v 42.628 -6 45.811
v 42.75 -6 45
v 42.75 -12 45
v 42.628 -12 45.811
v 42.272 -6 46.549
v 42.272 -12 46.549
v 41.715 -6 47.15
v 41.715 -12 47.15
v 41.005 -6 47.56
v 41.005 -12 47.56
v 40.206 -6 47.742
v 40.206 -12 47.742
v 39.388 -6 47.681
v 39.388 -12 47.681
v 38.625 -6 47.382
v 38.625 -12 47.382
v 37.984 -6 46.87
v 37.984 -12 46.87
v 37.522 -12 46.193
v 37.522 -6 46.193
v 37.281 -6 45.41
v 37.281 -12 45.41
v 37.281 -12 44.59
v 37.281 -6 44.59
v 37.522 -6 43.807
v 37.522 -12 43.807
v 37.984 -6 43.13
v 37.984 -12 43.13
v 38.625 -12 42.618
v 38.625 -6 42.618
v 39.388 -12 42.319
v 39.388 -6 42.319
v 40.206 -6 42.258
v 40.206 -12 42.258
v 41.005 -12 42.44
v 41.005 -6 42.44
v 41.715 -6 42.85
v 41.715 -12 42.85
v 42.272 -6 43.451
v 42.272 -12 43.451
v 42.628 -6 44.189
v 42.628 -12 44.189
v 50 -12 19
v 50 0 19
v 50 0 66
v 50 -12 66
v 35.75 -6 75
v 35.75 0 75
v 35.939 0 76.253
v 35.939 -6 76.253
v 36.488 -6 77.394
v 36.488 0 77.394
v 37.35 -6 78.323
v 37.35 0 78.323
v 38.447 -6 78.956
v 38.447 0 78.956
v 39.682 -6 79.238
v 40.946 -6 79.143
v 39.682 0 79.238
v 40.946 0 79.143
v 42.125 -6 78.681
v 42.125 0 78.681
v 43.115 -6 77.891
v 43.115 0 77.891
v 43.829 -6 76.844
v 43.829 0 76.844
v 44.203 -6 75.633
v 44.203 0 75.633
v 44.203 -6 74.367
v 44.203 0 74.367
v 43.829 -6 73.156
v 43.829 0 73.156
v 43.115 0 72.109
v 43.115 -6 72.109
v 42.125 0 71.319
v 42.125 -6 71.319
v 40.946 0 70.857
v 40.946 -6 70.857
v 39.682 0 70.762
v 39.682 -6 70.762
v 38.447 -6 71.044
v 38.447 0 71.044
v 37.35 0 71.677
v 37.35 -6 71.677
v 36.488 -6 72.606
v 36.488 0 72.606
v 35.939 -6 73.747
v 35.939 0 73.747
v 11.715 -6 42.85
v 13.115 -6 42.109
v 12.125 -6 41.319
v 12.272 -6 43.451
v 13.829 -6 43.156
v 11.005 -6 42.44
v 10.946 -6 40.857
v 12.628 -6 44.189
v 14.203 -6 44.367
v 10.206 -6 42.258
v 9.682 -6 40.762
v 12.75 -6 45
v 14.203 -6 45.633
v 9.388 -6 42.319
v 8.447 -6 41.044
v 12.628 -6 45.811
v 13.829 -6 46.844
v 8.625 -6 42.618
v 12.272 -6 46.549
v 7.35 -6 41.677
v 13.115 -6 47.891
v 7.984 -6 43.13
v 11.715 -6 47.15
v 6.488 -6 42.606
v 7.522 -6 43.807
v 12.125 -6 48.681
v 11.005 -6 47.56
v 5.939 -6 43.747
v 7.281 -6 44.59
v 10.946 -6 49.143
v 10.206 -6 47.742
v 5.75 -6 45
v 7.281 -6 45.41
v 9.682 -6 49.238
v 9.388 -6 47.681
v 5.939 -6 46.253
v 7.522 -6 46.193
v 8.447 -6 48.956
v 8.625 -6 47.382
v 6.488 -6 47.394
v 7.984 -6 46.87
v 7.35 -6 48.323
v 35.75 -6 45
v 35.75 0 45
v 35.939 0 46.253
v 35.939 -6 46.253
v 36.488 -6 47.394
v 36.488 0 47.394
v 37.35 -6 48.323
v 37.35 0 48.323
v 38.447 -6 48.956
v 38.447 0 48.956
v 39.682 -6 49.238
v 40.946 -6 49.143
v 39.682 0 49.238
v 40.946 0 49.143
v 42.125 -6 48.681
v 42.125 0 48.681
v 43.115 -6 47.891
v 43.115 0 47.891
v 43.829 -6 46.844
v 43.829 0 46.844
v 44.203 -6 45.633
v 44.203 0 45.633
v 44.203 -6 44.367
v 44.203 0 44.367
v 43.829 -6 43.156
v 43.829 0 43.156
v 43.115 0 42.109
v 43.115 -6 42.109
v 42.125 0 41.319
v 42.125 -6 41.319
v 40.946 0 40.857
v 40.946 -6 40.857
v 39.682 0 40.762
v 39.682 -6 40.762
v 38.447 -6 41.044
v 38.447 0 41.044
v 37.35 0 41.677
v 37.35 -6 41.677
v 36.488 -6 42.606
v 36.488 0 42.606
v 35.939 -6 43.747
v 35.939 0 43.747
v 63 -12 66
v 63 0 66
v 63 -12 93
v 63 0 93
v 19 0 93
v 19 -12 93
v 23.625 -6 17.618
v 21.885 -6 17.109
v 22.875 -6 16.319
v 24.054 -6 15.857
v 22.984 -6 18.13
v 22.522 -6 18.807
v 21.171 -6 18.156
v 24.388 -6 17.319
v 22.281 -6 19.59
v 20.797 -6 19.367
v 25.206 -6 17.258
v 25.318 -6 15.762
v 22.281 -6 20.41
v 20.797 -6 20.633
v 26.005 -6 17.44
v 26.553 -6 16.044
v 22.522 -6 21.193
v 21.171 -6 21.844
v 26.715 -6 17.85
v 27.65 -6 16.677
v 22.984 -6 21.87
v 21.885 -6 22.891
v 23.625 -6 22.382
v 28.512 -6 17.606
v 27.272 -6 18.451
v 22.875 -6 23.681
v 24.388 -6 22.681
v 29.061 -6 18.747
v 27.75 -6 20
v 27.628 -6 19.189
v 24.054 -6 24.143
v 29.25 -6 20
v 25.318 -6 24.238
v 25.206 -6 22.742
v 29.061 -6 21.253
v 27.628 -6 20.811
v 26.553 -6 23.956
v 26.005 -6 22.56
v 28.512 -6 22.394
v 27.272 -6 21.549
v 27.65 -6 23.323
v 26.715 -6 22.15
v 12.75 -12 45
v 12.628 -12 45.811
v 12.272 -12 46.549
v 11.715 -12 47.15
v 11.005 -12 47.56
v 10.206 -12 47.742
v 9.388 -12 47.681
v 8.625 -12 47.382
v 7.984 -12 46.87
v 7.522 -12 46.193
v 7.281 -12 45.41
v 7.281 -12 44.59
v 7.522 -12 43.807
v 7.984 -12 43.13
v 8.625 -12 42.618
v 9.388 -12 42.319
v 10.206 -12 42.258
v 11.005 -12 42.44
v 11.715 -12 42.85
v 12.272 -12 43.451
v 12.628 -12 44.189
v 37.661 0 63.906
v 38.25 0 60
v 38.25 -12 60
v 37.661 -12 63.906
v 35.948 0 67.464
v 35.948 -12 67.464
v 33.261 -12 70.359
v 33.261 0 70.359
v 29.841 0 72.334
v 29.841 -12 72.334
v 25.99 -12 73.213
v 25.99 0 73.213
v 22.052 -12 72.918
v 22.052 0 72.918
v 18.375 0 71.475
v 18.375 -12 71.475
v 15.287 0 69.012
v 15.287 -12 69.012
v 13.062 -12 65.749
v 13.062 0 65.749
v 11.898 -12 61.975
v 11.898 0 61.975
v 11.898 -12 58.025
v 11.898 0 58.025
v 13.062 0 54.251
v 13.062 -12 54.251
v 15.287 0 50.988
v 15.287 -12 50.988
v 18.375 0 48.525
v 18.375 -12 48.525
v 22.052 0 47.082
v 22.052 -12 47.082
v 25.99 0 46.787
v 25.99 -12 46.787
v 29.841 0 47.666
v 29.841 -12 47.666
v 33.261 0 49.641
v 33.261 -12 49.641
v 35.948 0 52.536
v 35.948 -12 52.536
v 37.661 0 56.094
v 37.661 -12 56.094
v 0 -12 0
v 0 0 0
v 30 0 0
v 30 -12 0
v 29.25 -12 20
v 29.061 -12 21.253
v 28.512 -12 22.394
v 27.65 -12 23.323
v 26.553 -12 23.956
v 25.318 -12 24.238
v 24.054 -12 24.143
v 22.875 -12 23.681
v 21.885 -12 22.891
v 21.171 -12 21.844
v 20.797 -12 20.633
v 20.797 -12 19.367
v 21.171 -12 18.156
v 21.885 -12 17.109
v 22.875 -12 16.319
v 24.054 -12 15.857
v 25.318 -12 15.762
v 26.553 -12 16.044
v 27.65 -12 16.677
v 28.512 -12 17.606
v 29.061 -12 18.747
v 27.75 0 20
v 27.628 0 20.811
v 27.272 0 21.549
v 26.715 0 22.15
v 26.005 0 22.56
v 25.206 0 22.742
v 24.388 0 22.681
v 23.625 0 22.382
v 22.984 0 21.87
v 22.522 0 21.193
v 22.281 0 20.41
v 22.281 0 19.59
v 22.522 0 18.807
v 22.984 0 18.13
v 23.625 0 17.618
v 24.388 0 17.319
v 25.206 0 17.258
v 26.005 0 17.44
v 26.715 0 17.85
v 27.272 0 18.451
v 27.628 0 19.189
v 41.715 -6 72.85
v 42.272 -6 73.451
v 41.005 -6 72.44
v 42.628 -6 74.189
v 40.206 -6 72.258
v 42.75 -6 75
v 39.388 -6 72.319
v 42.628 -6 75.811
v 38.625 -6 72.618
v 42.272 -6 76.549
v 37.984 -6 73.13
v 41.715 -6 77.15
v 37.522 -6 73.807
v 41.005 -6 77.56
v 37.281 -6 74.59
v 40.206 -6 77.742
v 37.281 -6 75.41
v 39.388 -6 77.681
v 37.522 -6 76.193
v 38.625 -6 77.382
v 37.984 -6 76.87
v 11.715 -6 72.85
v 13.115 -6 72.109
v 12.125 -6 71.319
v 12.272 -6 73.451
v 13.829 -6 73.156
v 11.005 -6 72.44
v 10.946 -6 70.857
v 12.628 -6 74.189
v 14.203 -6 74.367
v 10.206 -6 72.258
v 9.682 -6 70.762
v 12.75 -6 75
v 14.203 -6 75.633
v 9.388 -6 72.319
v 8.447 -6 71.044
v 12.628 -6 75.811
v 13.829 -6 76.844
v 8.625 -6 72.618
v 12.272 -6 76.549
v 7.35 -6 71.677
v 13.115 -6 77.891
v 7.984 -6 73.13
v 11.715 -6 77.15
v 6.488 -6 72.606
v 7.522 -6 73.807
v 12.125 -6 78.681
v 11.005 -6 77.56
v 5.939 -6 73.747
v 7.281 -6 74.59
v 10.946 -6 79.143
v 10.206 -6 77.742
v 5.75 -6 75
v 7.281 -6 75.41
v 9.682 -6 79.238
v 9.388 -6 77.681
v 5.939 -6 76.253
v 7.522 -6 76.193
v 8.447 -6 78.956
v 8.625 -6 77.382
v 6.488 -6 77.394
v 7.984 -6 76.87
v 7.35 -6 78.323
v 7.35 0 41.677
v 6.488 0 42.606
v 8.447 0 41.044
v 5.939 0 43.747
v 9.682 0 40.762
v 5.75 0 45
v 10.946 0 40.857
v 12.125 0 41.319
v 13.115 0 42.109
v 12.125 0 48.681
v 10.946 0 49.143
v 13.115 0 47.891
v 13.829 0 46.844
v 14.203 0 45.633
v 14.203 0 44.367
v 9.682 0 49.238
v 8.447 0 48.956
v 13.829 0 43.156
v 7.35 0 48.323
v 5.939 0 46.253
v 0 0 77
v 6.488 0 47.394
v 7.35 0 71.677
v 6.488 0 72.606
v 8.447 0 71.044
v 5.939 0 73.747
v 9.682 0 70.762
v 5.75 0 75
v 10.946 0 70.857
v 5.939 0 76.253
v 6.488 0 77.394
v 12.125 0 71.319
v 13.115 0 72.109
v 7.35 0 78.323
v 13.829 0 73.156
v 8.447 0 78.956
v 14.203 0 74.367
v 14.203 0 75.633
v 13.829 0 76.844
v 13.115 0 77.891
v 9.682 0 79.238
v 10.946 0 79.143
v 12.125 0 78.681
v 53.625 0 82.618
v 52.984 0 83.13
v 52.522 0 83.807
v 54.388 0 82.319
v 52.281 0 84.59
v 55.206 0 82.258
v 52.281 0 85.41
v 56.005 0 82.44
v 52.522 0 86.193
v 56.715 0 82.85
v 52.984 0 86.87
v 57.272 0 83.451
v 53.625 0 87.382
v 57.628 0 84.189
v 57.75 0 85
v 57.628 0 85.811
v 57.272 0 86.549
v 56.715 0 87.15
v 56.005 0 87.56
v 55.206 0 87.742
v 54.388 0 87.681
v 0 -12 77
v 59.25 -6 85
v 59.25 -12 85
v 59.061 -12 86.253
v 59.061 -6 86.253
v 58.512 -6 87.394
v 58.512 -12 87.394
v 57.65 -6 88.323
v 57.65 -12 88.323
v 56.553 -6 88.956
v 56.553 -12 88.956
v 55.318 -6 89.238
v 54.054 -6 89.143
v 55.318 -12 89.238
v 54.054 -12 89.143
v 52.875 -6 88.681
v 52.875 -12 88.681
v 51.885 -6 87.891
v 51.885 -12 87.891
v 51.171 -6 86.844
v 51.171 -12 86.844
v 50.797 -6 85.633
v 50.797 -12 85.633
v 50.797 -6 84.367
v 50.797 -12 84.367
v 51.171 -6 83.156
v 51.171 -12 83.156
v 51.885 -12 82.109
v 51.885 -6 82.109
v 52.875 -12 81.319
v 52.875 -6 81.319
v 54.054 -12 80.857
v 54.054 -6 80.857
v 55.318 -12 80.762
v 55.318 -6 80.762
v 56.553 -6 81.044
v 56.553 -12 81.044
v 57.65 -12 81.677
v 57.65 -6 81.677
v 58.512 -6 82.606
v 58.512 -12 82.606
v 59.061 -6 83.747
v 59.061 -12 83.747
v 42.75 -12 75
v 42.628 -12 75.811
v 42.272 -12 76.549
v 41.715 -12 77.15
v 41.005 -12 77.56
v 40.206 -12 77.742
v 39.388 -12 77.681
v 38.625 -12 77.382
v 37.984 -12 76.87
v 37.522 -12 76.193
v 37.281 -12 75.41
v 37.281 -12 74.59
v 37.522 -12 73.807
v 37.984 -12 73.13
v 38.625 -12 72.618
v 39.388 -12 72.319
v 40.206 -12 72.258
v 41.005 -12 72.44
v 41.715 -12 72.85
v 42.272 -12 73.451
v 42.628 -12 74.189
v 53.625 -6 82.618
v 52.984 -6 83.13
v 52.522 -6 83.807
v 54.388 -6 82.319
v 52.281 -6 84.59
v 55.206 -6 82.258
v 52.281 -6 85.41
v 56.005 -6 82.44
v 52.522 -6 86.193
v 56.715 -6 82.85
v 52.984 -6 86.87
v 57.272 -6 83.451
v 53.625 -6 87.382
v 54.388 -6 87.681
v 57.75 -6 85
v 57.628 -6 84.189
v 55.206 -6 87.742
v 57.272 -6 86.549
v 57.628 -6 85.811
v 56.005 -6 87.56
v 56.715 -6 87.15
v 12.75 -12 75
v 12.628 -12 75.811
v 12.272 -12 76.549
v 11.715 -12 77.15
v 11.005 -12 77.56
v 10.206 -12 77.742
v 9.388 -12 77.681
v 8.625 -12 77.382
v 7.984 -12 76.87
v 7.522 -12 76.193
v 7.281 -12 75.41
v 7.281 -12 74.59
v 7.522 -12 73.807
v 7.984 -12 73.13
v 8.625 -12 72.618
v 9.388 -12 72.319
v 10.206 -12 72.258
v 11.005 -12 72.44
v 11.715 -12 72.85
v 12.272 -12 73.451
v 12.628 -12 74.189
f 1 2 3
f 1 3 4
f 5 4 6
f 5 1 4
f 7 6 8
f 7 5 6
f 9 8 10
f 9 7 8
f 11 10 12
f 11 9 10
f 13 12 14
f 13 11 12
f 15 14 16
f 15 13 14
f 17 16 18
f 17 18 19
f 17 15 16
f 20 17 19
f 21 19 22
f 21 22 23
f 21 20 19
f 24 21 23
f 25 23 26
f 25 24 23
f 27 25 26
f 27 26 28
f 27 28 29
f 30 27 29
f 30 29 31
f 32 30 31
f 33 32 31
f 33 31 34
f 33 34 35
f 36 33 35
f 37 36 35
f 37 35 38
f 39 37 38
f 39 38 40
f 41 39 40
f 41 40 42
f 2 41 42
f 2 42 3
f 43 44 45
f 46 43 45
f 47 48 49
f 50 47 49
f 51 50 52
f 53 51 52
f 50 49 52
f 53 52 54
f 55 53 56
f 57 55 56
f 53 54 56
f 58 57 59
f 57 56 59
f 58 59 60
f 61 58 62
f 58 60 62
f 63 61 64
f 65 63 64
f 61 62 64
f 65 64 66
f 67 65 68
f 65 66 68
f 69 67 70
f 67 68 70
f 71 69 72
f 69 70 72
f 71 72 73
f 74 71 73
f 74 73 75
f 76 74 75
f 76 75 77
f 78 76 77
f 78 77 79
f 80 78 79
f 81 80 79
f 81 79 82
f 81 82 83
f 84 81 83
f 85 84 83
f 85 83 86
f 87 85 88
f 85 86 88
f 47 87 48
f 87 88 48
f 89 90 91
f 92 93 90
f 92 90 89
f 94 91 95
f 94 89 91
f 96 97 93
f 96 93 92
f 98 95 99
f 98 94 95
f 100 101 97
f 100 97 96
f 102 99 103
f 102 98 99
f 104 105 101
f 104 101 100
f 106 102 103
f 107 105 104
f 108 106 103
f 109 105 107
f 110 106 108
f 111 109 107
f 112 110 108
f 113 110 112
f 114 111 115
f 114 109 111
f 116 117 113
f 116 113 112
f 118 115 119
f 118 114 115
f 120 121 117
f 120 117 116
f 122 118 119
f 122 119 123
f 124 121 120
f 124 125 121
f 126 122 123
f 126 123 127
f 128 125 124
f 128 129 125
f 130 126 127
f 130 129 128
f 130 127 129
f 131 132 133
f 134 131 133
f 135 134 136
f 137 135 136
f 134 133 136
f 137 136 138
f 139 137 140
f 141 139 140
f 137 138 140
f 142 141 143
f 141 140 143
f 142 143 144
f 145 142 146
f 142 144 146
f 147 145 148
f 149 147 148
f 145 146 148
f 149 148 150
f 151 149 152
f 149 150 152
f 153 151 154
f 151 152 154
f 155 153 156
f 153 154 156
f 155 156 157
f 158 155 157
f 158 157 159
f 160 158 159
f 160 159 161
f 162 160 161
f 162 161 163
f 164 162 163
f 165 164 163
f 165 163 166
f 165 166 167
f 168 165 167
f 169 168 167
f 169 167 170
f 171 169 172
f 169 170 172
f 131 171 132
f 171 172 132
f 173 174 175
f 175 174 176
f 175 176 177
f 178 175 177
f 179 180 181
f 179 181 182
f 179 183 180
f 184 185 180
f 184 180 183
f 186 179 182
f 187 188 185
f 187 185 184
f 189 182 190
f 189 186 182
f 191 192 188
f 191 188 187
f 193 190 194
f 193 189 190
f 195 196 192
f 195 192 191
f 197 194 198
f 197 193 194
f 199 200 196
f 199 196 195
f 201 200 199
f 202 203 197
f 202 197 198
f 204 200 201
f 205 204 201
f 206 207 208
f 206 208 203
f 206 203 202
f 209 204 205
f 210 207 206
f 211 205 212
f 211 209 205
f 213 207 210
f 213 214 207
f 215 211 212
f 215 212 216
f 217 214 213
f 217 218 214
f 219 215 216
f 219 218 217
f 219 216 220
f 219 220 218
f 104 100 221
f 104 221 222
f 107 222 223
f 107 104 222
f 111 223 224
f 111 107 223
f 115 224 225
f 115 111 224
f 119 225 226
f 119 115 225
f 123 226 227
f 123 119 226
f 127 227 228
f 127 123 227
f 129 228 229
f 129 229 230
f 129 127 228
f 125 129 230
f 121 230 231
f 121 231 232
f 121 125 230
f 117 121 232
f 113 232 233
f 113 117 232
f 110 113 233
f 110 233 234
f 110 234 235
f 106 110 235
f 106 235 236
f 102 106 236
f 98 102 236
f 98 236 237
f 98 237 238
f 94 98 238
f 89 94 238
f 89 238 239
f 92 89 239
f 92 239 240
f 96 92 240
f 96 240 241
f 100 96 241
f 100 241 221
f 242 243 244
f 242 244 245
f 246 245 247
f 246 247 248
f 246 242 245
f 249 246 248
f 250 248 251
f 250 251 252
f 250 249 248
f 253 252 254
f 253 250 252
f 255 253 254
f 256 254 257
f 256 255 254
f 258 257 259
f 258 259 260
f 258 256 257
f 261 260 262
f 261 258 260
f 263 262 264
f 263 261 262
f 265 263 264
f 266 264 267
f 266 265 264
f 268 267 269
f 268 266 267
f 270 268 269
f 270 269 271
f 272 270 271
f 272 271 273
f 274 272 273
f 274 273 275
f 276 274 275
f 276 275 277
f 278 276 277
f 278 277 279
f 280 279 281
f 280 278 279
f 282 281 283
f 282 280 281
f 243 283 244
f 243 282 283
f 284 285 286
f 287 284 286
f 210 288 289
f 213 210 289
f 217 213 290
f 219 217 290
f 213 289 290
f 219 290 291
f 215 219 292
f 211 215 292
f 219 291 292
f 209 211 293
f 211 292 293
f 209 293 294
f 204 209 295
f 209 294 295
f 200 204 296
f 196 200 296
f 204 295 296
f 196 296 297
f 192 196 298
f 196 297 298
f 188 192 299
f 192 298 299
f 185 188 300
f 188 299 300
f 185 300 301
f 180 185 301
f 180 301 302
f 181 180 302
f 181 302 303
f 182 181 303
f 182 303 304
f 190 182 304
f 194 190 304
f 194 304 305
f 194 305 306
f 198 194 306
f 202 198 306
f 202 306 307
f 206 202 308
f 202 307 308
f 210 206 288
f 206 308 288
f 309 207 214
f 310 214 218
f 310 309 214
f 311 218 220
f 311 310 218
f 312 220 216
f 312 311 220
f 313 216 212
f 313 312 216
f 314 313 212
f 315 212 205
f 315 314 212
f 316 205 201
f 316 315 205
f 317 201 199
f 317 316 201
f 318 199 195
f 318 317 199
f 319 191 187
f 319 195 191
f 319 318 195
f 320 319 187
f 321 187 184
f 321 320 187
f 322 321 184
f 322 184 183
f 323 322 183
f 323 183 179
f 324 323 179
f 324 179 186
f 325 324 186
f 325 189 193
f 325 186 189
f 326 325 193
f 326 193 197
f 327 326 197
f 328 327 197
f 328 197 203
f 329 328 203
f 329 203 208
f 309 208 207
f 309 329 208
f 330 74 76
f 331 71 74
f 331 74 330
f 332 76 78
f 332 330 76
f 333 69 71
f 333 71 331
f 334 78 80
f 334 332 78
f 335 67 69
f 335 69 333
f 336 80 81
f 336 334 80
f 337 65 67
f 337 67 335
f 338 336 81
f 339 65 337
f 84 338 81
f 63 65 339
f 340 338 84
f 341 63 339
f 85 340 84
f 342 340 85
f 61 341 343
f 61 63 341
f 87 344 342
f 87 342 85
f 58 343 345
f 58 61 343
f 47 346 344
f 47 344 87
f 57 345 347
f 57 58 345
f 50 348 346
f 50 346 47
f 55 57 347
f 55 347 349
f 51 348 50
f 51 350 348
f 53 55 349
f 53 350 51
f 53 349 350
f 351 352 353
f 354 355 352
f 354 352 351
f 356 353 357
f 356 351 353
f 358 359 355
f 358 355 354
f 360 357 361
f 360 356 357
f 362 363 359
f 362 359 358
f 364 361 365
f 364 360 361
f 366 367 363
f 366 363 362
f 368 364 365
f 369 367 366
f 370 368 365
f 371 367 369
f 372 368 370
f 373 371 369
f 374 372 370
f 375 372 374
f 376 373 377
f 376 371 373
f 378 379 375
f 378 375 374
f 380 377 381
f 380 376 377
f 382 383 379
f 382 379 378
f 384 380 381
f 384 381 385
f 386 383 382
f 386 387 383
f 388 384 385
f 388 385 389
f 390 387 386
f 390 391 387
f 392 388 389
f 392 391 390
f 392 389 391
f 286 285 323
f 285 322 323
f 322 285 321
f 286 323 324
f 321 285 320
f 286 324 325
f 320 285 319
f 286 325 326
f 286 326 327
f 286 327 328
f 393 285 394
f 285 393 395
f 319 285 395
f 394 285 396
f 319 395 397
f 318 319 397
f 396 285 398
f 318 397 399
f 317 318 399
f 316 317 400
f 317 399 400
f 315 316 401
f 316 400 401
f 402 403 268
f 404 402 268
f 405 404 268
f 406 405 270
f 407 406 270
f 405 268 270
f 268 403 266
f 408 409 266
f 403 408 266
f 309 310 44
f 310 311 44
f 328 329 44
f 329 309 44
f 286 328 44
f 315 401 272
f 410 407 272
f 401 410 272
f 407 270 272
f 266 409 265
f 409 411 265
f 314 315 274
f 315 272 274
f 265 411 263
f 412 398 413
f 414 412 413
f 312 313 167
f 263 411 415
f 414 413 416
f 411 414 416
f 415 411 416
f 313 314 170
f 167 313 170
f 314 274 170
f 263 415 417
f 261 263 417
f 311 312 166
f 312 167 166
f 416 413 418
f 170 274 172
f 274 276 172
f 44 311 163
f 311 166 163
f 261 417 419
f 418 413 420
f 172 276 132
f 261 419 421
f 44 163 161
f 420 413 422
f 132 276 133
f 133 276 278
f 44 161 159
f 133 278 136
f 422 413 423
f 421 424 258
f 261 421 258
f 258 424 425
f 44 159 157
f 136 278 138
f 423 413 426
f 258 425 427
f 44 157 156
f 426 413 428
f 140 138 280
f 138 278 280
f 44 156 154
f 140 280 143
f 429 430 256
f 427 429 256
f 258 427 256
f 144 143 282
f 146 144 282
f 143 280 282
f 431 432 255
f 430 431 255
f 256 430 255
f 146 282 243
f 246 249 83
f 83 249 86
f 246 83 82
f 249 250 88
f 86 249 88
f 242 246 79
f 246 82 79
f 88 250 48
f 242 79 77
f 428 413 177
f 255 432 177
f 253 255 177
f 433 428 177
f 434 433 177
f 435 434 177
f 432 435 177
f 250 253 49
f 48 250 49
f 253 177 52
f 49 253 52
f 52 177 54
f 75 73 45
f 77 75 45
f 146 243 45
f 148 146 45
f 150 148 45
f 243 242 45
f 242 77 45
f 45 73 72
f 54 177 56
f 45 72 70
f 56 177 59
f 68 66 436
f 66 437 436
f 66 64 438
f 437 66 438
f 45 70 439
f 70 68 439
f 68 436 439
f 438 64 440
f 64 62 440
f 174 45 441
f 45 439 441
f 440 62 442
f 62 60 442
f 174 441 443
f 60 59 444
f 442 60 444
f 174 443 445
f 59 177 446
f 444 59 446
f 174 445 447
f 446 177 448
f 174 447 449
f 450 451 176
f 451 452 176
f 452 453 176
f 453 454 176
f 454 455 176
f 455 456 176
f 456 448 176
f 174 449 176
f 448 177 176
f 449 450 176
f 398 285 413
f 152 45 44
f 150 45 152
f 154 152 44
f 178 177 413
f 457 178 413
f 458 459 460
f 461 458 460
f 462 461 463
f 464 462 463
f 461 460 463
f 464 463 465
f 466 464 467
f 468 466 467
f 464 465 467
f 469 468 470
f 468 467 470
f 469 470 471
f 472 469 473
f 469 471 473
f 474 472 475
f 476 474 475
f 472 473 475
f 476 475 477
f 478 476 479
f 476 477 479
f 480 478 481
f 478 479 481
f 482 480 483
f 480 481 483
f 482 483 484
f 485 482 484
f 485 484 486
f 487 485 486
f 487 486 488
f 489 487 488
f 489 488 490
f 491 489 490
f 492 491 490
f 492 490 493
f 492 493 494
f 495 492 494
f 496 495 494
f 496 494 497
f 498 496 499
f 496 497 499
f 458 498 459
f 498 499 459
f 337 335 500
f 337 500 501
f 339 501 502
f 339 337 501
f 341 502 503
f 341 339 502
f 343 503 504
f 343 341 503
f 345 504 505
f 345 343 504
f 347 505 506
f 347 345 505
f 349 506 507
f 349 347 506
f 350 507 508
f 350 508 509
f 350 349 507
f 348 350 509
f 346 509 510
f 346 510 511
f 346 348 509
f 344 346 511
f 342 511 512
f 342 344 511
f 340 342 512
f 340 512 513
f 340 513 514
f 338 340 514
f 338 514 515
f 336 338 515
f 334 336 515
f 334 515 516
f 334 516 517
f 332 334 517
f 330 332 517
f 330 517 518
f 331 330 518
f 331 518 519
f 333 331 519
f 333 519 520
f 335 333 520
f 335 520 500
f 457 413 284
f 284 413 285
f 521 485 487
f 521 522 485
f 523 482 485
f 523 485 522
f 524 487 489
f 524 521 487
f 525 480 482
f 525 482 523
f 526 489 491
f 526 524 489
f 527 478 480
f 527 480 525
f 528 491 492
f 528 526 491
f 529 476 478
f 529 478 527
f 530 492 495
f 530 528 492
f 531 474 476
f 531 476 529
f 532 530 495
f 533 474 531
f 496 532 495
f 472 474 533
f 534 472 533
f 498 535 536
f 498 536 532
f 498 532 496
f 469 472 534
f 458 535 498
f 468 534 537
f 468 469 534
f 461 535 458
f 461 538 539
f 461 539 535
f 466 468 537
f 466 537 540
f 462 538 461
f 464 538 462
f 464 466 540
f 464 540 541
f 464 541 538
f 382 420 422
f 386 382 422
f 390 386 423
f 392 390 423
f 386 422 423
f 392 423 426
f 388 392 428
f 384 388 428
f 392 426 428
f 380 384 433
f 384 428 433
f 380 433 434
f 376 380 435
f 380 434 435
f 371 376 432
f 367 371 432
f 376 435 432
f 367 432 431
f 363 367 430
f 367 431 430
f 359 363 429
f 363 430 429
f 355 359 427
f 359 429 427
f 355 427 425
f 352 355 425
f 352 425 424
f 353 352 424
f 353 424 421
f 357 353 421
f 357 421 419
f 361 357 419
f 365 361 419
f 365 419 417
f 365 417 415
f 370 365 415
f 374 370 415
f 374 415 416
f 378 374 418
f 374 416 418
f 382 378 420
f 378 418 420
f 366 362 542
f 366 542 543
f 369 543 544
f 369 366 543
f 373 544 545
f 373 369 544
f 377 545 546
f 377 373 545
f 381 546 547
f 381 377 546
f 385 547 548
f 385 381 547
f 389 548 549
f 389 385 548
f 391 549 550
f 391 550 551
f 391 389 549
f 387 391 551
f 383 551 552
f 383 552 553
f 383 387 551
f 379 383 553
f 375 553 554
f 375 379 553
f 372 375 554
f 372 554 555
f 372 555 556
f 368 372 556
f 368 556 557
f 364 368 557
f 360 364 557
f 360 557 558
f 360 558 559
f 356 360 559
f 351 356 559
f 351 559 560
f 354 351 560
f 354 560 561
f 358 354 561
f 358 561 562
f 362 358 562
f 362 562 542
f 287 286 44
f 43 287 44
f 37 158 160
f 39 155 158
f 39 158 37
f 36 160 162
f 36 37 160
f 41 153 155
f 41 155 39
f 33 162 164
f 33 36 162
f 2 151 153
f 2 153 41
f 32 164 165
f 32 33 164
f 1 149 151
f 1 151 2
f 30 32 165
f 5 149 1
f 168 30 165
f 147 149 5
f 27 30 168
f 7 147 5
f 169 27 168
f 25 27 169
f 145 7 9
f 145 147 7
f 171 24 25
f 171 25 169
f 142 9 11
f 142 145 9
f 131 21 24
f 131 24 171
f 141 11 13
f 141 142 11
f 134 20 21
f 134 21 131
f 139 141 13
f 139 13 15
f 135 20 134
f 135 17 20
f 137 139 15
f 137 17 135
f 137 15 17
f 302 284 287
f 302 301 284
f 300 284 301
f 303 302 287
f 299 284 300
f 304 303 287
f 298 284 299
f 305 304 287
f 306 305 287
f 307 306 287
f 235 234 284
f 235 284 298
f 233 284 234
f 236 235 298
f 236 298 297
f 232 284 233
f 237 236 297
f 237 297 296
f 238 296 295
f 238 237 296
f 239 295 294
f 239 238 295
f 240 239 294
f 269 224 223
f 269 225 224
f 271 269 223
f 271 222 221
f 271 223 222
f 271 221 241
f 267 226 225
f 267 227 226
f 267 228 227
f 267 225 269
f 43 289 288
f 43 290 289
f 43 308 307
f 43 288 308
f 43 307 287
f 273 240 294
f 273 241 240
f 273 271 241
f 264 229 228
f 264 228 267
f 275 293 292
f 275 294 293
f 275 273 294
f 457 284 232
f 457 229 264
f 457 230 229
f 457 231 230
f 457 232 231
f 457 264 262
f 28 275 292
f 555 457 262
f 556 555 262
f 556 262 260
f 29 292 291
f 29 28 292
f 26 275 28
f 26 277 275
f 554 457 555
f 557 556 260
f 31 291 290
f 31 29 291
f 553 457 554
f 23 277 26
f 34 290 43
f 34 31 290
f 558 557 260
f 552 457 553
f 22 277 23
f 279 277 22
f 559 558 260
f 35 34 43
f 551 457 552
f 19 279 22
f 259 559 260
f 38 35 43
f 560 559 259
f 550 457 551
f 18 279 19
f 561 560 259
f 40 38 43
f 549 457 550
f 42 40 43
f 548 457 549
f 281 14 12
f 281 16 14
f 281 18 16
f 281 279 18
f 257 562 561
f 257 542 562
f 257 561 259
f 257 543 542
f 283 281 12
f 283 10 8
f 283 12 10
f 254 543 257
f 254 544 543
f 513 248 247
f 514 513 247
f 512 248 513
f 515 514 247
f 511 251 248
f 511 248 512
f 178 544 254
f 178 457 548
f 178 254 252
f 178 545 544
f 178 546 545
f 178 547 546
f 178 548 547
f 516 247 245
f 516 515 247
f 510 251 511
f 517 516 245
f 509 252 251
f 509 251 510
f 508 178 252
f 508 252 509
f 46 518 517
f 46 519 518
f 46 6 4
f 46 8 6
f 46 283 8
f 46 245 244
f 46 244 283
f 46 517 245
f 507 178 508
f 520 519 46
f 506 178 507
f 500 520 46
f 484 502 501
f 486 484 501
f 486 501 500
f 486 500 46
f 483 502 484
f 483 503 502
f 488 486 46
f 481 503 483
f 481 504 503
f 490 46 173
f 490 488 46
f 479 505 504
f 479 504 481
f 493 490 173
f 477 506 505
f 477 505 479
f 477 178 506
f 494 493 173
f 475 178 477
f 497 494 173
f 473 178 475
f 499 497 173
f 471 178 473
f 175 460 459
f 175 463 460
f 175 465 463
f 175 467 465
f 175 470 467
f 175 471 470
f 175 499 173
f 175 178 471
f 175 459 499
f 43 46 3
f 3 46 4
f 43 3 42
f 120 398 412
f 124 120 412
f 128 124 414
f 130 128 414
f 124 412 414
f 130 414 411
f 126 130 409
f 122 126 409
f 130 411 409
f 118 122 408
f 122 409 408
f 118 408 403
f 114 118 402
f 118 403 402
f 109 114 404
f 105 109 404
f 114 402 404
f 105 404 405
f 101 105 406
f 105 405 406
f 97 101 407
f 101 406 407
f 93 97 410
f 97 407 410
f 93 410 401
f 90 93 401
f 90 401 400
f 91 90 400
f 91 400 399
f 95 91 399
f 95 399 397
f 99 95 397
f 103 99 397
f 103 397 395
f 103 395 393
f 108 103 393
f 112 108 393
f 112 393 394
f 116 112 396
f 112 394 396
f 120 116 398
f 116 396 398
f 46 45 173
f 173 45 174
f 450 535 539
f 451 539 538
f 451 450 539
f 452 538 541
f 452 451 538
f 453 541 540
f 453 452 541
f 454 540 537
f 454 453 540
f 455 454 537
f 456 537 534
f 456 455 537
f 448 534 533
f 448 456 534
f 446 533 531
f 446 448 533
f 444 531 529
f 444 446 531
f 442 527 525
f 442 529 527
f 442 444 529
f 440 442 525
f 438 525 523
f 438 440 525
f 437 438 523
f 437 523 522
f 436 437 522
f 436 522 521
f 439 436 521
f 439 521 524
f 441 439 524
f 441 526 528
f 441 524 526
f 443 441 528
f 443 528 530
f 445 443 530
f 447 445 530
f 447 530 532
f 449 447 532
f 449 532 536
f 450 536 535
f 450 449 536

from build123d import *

# Parameters (mm, degrees)
F0_R     = 2.75
F0_R_2   = 13.25
F1_DEPTH = 12
F2_R     = 4.25
F3_DEPTH = 6
F4_R     = 4.25
F5_DEPTH = 6


with BuildPart() as f1:
    # F0 (on Front) → F1 (new body)
    with BuildSketch(Plane.XZ):
        Polygon((19, 93), (0, 77), (0, 0), (30, 0), (50, 19), (50, 66), (63, 66), (63, 93), align=None)
        with Locations((25, 20)):
            Circle(F0_R, mode=Mode.SUBTRACT)
        with Locations((10, 45)):
            Circle(F0_R, mode=Mode.SUBTRACT)
        with Locations((40, 45)):
            Circle(F0_R, mode=Mode.SUBTRACT)
        with Locations((25, 60)):
            Circle(F0_R_2, mode=Mode.SUBTRACT)
        with Locations((10, 75)):
            Circle(F0_R, mode=Mode.SUBTRACT)
        with Locations((40, 75)):
            Circle(F0_R, mode=Mode.SUBTRACT)
        with Locations((55, 85)):
            Circle(F0_R, mode=Mode.SUBTRACT)
    extrude(amount=F1_DEPTH)

    # F2 (on face) → F3 (cut)
    with BuildSketch(Plane.XZ.offset(12)):
        with Locations((55, 85)):
            Circle(F2_R)
        with Locations((25, 20)):
            Circle(F2_R)
    extrude(amount=-F3_DEPTH, mode=Mode.SUBTRACT)

    # F4 (on face) → F5 (cut)
    with BuildSketch(Plane(origin=(0, 0, 0), x_dir=(-1, 0, 0), z_dir=(0, 1, 0))):
        with Locations((-10, 75)):
            Circle(F4_R)
        with Locations((-40, 75)):
            Circle(F4_R)
        with Locations((-40, 45)):
            Circle(F4_R)
        with Locations((-10, 45)):
            Circle(F4_R)
    extrude(amount=-F5_DEPTH, mode=Mode.SUBTRACT)


solid = f1.part
